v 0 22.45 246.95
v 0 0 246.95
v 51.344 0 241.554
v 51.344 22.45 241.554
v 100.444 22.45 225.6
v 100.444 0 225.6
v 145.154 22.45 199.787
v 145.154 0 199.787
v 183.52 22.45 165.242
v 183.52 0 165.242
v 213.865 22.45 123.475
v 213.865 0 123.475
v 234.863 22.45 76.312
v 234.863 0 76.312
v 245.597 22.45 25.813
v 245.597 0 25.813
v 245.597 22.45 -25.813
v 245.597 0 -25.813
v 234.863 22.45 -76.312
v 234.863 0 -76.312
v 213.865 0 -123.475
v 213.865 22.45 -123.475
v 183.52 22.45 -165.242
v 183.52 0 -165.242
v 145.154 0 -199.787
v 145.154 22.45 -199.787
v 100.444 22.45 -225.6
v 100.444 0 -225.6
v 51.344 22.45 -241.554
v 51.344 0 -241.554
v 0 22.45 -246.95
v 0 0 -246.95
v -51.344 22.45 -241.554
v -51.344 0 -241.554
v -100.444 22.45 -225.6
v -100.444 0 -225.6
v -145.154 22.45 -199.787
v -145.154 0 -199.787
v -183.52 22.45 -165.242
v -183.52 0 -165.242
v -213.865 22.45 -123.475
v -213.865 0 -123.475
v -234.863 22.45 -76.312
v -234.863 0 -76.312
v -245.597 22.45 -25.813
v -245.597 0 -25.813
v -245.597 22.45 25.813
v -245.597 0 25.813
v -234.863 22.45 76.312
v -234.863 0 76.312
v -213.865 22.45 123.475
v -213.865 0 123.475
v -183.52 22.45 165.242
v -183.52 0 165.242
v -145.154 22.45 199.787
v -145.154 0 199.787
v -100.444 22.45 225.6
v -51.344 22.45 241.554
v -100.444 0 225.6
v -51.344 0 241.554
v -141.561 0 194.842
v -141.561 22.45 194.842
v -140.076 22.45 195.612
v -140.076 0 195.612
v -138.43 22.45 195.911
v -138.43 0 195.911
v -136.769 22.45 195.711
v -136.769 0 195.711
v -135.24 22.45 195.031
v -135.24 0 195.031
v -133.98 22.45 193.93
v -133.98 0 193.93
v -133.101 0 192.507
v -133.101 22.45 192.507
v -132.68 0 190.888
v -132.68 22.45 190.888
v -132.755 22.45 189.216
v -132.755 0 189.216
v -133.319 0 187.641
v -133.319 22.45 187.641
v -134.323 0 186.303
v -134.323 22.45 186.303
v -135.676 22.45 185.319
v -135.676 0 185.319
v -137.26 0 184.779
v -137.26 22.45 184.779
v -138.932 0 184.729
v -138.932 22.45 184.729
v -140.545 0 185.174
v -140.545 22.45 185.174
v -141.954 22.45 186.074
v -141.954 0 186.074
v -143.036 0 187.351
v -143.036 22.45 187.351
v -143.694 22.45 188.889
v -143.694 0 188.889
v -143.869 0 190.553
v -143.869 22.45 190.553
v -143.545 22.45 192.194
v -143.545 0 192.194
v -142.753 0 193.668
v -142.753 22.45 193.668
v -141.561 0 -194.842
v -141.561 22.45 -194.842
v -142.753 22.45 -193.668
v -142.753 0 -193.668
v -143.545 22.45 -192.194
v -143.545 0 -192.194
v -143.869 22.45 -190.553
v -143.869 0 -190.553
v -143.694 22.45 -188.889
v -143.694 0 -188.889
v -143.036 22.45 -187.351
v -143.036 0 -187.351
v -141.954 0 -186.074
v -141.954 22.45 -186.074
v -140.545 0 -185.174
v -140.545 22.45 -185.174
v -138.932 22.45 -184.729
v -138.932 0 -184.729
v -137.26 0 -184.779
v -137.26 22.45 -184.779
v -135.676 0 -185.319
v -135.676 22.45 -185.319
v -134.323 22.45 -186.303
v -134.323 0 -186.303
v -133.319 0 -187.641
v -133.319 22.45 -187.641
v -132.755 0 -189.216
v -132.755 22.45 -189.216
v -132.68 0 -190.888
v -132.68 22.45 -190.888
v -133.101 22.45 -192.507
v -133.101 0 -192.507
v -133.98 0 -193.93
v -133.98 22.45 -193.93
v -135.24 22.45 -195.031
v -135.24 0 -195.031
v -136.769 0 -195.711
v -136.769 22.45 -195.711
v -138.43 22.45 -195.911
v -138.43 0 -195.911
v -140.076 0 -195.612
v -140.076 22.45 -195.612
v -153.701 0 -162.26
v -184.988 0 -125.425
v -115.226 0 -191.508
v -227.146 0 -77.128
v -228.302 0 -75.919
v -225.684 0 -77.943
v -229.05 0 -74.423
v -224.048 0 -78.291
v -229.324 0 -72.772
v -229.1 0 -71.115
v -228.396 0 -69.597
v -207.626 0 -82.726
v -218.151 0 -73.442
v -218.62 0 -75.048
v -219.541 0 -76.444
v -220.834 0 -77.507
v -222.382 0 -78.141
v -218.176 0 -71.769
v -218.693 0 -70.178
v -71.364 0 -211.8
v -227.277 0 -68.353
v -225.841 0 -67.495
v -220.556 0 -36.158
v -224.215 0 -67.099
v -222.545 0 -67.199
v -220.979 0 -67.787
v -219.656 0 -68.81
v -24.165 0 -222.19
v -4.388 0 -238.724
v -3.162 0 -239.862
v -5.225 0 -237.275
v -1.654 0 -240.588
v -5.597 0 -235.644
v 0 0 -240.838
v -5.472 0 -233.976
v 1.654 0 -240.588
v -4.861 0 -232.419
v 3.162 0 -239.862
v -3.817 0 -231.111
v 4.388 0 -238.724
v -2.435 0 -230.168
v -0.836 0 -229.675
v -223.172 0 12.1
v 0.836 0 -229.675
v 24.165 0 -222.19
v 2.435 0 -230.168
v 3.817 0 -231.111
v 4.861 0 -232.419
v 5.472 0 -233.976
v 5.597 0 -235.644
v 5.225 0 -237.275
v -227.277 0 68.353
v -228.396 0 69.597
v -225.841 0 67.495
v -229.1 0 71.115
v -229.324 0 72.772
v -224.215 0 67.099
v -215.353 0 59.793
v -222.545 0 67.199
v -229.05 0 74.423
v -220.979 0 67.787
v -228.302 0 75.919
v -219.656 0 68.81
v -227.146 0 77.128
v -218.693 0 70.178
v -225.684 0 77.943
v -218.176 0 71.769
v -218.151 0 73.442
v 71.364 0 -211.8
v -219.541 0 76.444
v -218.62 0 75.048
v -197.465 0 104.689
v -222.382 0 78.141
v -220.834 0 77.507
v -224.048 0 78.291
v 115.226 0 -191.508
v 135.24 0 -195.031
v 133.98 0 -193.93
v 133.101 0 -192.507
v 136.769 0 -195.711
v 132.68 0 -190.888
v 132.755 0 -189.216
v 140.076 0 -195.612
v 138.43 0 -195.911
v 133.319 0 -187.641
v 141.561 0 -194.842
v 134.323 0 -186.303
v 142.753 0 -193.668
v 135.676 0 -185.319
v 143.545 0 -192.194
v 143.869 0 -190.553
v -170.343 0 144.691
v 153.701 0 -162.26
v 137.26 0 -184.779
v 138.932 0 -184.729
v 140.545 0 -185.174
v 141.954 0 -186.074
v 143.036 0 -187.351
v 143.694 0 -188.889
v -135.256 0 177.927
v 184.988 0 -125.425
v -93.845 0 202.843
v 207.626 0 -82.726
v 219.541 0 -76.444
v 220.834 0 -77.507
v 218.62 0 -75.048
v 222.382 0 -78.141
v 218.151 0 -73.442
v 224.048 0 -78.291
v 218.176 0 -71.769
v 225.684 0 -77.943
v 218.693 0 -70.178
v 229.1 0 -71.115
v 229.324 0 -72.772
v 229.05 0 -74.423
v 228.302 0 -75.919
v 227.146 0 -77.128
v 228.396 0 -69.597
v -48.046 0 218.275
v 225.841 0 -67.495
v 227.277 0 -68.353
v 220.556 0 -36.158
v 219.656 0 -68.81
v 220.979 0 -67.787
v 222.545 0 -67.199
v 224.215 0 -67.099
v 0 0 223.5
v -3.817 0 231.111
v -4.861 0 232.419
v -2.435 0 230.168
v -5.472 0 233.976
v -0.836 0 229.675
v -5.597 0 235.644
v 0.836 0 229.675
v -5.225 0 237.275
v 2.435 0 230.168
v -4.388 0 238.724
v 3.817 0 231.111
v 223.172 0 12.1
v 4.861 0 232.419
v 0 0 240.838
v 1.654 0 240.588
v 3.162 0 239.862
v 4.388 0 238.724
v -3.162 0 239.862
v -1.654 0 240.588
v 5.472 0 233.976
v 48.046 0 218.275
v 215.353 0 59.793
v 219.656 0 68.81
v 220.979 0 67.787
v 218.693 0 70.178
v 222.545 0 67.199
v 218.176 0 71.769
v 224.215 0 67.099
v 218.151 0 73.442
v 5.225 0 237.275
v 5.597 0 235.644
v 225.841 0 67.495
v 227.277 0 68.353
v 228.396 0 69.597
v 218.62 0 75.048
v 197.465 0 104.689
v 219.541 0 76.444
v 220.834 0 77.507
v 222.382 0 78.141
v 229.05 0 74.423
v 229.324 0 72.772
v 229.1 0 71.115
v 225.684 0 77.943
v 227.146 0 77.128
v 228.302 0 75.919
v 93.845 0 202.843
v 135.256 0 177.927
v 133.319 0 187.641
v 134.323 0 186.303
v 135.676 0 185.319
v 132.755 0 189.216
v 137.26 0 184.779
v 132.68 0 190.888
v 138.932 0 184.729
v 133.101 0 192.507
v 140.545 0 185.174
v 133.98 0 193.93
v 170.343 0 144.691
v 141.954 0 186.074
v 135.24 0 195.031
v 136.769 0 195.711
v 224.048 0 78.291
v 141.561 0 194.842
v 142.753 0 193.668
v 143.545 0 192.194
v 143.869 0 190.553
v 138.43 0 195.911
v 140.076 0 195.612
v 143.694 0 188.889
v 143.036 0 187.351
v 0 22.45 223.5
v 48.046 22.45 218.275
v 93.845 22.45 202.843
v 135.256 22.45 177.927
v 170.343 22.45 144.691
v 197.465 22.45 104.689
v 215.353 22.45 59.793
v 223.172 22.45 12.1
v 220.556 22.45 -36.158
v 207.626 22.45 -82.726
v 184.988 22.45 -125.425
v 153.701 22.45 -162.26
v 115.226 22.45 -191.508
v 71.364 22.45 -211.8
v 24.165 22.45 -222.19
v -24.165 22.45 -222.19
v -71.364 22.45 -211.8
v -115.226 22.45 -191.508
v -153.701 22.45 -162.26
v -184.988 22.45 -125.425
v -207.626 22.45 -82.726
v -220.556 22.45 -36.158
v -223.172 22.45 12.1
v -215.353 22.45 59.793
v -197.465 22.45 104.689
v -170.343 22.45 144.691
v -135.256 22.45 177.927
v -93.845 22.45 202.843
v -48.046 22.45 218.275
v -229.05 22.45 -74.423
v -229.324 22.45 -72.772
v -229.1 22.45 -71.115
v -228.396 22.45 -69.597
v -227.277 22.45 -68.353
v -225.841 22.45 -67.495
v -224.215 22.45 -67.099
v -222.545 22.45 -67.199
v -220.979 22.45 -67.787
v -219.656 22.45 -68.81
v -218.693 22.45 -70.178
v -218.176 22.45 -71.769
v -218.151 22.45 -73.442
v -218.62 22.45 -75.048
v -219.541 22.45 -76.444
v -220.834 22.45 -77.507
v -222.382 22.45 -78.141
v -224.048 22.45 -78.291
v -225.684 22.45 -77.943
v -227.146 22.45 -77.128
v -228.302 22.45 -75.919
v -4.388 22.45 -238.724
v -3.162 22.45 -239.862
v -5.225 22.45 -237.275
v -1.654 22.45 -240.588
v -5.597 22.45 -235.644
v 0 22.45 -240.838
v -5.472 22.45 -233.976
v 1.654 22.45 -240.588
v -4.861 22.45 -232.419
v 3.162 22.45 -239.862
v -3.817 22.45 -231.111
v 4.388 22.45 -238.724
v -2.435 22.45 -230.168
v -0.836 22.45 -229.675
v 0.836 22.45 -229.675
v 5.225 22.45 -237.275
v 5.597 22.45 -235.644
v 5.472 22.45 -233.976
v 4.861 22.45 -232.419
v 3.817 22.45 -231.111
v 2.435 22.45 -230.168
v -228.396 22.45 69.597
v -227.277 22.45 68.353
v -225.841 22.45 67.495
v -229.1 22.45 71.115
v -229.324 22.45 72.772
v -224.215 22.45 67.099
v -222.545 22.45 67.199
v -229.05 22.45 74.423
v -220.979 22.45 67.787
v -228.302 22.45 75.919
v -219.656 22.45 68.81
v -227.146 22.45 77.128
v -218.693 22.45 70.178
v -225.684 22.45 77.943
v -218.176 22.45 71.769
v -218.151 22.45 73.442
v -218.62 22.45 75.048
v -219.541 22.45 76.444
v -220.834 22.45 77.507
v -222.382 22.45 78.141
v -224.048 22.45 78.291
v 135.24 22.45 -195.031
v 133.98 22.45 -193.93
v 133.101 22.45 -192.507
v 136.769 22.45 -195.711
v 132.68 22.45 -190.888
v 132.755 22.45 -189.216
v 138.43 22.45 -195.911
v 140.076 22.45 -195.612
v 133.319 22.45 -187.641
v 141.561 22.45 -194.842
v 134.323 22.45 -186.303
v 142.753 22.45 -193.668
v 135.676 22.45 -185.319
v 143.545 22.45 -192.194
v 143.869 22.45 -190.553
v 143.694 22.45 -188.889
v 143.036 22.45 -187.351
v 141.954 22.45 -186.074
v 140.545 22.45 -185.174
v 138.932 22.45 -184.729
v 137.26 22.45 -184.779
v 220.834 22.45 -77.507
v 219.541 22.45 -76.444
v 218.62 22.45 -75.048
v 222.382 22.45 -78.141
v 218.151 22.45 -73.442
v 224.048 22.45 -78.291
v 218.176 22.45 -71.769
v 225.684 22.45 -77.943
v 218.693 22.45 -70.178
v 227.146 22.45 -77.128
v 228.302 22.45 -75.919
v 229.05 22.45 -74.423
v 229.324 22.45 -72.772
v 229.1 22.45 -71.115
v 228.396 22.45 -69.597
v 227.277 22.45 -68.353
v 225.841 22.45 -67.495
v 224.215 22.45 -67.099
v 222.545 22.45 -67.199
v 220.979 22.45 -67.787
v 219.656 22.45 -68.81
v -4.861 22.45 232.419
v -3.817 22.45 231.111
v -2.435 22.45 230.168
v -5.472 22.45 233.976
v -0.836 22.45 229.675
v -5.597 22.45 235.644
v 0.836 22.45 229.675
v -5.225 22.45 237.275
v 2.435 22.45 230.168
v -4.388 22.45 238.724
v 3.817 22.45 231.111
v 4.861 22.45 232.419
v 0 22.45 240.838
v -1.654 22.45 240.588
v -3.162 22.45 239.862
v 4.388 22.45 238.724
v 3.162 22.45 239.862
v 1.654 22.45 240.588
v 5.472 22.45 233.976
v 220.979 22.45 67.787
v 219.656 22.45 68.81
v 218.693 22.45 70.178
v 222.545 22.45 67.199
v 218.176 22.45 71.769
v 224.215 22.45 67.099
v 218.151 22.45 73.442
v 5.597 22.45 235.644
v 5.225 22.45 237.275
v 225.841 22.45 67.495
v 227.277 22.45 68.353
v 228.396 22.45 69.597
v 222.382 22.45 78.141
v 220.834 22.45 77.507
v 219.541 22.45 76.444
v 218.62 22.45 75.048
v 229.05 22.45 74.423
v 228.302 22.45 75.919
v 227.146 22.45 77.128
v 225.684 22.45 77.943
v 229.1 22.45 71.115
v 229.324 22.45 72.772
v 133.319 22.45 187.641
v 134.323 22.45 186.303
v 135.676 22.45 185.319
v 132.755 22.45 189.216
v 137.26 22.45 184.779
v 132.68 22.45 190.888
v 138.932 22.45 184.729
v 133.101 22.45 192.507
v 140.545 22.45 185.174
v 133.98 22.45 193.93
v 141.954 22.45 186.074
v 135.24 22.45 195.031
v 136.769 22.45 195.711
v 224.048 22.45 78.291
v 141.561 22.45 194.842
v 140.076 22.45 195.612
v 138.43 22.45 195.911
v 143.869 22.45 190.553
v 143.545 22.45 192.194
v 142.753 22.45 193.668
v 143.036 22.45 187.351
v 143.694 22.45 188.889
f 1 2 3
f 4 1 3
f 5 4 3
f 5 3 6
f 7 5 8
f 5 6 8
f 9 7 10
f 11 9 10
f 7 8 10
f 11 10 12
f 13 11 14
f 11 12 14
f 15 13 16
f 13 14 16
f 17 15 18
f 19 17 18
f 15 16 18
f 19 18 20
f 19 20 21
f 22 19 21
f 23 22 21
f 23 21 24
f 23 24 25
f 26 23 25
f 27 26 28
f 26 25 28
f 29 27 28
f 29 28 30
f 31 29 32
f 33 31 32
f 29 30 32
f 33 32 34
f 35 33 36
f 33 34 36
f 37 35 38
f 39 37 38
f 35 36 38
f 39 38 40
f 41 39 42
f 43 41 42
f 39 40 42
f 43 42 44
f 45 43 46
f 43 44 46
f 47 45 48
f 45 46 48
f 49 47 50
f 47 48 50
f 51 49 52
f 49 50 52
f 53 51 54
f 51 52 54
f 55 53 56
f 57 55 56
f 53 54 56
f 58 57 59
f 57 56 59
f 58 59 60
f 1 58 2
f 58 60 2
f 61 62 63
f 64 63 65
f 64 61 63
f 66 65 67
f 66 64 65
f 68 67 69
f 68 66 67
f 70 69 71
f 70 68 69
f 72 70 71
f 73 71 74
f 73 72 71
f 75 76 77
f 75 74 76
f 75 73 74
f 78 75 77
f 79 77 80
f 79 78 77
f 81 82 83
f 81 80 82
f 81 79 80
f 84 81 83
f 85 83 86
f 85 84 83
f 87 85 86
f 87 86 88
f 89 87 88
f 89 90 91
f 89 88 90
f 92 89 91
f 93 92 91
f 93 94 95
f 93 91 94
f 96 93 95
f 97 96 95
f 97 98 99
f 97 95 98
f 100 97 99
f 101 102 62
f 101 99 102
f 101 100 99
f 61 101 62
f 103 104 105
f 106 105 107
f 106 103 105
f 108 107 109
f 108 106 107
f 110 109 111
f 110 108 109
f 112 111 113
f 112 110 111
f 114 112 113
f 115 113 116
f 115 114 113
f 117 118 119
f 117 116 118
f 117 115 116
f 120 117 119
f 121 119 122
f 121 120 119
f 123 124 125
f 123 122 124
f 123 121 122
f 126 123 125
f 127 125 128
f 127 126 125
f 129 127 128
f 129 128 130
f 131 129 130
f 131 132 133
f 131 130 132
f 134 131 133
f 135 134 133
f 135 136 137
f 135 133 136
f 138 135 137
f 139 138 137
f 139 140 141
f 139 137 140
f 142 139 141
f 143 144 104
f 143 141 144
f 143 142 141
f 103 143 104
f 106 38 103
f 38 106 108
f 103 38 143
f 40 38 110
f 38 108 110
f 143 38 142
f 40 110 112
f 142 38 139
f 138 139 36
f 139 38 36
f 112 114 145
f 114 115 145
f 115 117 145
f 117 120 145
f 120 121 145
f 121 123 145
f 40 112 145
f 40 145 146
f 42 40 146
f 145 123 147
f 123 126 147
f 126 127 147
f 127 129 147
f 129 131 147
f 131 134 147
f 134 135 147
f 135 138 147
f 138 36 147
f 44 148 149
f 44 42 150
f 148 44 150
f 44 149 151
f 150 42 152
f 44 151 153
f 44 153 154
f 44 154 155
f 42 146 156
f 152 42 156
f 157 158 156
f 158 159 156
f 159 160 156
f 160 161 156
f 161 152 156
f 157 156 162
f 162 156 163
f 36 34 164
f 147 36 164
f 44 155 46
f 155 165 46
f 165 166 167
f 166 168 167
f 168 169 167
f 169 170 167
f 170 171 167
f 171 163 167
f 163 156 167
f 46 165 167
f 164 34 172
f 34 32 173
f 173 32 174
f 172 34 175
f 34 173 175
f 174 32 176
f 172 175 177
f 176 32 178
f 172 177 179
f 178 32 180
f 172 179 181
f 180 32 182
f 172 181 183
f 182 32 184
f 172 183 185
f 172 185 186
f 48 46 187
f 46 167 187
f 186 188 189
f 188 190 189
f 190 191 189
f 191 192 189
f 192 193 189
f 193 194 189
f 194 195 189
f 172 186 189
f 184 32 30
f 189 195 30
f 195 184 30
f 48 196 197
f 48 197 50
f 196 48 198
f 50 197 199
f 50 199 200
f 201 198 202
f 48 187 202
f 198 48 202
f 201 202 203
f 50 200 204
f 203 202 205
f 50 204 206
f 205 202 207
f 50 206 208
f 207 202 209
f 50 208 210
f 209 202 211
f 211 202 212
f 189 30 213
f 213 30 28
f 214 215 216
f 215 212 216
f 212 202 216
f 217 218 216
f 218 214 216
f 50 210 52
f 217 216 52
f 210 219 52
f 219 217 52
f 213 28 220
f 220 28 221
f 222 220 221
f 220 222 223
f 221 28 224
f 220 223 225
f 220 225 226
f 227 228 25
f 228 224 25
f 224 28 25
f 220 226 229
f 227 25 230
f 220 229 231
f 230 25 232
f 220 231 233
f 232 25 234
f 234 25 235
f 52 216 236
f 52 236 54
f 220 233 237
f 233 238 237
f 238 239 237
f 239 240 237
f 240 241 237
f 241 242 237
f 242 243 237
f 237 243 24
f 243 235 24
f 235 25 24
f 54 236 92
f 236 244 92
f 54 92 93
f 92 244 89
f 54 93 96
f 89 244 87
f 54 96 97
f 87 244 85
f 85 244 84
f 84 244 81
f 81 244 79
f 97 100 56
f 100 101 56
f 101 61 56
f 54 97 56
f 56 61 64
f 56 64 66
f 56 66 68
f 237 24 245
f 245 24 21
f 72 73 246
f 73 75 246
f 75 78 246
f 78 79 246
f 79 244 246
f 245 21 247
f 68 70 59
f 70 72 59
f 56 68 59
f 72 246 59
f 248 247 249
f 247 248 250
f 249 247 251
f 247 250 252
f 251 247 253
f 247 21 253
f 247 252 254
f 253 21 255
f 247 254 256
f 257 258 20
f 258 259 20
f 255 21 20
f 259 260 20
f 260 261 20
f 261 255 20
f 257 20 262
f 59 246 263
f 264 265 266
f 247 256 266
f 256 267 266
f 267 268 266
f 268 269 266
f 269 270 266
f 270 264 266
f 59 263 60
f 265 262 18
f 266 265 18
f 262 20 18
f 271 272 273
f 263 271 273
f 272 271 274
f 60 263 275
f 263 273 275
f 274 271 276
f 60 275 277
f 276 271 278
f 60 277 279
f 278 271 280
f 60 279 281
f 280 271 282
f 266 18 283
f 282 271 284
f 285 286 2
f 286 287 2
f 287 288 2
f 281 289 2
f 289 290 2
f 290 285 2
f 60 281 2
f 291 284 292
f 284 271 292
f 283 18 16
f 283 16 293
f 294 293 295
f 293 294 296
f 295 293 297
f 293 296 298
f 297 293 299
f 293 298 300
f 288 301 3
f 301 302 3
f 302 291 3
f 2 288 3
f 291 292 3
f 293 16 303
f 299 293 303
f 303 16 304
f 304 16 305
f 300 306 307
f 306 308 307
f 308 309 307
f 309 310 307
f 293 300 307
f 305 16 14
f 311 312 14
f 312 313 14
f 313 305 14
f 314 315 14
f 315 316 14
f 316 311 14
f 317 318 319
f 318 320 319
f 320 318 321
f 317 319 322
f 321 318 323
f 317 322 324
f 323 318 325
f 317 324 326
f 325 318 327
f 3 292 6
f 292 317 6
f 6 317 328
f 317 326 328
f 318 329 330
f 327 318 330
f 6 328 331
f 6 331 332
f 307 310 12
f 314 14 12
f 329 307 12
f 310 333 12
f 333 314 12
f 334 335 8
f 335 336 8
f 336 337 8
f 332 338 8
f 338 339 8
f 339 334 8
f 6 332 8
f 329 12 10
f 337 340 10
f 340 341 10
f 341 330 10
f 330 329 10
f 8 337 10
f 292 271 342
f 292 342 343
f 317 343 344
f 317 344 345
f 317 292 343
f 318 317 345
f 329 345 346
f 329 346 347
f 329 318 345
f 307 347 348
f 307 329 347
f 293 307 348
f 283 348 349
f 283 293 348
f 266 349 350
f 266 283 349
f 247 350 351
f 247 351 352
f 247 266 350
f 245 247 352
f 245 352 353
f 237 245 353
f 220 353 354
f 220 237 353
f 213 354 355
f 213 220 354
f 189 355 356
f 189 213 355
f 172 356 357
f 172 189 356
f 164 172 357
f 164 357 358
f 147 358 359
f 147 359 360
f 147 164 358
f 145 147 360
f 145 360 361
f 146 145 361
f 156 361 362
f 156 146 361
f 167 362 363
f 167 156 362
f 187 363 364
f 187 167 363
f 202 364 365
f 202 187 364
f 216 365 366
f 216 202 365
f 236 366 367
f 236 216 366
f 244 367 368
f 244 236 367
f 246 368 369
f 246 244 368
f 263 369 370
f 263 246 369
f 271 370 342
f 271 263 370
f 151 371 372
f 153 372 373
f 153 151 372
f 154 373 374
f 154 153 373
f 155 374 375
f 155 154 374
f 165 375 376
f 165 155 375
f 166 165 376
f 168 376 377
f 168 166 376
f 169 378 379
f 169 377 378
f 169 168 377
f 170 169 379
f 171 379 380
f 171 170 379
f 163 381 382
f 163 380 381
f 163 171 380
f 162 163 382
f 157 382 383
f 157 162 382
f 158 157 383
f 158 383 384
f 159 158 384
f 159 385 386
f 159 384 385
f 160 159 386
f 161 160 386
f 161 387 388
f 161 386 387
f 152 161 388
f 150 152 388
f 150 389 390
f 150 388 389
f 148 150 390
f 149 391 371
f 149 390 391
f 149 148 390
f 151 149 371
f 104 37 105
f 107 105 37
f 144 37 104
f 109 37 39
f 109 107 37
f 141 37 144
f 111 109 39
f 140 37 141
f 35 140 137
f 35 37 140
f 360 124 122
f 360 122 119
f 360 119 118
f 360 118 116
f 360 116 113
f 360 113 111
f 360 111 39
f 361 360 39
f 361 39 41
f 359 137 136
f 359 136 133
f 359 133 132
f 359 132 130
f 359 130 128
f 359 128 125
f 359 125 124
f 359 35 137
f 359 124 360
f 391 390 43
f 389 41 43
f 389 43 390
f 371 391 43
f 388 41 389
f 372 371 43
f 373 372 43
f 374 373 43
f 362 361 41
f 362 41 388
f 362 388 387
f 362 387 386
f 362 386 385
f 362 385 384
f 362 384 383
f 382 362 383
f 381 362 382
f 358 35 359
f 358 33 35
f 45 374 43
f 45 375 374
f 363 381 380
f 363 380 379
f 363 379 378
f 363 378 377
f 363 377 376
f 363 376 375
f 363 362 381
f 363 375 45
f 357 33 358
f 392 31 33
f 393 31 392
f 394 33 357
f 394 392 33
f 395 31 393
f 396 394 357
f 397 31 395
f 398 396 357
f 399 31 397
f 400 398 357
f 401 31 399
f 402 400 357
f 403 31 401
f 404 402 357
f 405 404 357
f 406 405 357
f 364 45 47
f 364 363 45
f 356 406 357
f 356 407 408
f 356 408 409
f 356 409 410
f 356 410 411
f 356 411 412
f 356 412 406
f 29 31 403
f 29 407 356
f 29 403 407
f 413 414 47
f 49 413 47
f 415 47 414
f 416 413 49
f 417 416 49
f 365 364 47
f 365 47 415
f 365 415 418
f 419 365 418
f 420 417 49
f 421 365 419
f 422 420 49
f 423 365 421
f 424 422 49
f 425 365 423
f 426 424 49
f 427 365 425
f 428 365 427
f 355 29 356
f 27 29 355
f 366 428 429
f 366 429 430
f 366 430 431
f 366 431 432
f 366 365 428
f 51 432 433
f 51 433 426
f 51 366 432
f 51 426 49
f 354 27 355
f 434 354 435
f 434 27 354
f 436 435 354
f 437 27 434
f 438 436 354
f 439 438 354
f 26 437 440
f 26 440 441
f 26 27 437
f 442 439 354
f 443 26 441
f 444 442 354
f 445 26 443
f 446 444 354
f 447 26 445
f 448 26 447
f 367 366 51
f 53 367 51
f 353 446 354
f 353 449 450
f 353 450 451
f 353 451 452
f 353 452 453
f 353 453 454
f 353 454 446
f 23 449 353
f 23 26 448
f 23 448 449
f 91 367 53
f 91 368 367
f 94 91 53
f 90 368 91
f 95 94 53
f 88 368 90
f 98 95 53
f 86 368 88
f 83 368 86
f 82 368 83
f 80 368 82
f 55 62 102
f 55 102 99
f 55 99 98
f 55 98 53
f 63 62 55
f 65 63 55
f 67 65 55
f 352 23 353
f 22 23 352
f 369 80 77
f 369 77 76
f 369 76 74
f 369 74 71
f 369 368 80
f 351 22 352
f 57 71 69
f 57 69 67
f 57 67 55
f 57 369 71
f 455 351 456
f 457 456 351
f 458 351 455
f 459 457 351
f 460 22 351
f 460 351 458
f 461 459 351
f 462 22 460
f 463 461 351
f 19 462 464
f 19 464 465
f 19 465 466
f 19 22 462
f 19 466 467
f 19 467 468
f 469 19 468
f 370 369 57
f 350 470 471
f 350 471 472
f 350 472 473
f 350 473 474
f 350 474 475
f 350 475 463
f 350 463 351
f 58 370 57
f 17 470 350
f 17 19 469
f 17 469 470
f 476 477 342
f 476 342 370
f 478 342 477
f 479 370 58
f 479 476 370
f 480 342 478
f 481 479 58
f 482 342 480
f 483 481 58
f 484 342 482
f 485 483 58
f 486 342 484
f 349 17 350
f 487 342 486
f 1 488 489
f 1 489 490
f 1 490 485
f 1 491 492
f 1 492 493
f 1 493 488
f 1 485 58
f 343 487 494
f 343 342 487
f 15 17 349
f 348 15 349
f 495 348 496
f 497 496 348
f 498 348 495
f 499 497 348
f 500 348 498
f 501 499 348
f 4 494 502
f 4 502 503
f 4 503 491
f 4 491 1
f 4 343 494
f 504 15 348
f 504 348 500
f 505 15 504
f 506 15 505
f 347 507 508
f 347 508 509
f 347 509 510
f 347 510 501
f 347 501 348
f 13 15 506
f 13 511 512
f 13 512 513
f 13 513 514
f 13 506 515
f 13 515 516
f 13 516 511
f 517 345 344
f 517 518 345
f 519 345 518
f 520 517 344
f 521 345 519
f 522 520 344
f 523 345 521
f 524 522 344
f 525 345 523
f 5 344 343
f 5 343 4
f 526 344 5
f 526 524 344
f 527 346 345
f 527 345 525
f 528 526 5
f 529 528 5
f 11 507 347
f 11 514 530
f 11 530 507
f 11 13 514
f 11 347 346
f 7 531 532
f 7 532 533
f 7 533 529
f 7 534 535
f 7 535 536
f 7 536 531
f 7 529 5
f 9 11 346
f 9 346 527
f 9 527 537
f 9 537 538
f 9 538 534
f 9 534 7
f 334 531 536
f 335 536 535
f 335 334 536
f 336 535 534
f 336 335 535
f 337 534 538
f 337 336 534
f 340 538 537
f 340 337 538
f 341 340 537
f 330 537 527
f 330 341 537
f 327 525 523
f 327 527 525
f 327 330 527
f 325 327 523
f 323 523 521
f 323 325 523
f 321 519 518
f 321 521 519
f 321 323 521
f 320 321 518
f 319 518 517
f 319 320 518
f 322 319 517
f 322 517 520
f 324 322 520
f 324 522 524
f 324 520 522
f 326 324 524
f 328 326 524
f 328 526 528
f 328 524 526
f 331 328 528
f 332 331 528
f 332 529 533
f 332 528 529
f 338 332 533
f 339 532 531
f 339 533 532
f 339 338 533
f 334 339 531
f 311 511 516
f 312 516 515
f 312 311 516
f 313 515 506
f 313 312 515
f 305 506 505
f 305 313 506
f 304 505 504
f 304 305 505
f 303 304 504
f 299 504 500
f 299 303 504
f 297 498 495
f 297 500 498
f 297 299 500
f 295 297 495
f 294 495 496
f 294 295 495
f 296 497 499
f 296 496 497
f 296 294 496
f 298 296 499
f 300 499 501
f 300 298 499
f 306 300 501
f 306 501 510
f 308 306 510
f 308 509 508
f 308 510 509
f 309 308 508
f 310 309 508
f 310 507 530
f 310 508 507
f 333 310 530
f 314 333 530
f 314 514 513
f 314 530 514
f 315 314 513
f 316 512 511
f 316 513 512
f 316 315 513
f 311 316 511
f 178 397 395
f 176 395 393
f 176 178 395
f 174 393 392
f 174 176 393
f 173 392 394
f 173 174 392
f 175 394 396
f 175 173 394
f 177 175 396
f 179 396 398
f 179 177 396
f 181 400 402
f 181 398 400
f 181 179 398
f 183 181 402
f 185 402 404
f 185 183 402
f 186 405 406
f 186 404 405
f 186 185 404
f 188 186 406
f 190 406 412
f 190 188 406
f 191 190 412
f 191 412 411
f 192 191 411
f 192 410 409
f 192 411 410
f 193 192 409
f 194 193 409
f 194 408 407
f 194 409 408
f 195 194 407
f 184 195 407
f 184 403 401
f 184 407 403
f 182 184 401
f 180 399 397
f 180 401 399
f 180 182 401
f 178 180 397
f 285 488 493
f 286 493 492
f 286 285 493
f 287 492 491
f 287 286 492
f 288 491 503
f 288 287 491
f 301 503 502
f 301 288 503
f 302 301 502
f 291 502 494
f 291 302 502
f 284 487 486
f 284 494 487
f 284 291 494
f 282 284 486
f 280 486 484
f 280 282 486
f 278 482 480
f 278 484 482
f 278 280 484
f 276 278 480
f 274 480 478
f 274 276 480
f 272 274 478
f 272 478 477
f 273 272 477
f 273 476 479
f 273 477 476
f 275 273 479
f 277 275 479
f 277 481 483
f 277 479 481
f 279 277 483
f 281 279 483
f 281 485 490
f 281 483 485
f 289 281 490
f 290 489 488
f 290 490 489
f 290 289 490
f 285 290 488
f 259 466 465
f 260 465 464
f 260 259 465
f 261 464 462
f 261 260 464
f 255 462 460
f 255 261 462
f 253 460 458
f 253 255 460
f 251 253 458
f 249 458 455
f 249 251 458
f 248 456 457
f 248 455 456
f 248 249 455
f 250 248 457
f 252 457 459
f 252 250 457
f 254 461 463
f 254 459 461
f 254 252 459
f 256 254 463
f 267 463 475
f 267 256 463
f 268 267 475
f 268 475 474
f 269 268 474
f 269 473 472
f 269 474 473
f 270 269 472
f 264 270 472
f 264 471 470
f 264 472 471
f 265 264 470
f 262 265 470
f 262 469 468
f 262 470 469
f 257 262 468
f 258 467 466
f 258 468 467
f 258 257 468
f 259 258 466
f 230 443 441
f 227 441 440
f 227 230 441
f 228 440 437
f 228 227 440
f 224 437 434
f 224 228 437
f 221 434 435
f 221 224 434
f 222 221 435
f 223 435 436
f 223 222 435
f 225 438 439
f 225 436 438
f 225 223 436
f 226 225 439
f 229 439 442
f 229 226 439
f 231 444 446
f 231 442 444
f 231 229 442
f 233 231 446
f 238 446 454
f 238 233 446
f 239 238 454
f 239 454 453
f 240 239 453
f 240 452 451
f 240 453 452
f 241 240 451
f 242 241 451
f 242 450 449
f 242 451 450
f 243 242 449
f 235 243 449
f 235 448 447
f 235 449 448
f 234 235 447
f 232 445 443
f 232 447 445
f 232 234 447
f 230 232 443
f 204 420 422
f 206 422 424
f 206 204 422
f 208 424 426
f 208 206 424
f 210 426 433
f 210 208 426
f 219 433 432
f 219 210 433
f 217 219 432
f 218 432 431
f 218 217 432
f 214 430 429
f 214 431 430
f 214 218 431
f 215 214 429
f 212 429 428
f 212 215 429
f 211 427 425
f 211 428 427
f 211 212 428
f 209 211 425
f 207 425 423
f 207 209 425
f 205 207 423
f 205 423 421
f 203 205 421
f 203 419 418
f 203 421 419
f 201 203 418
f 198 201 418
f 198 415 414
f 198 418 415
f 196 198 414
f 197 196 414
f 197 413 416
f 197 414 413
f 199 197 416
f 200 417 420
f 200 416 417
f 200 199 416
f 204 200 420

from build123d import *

# Parameters (mm, degrees)
SKETCH_1_R               = 246.95
SKETCH_1_R_2             = 223.5
EXTRUDE_5_DEPTH          = 22.45
SKETCH_1_5_R             = 5.6125
CUT_EXTRUDE_1_DEPTH      = 350.960865669
PATTERN_CIRCULAR_2_COUNT = 10


with BuildPart() as part:
    # Эскиз1 → Бобышка-Вытянуть5 (new body)
    with BuildSketch(Plane(origin=(0, 0, 0), x_dir=(1, 0, 0), z_dir=(0, 1, 0))):
        with Locations(Location((0, 0, 0), (0, 0, 270))):
            Circle(SKETCH_1_R)
        with Locations(Location((0, 0, 0), (0, 0, 270))):
            Circle(SKETCH_1_R_2, mode=Mode.SUBTRACT)
    extrude(amount=EXTRUDE_5_DEPTH)

    # Эскиз1<5> → Вырез-Вытянуть1 (cut, through all)
    with BuildSketch(Plane(origin=(0, 0, 0), x_dir=(1, 0, 0), z_dir=(0, 1, 0))):
        with Locations(Location((0, -235.225, 0), (0, 0, 270))):
            Circle(SKETCH_1_5_R)
    cut_extrude_1 = extrude(amount=CUT_EXTRUDE_1_DEPTH, mode=Mode.SUBTRACT)

    # Круговой массив2: Вырез-Вытянуть1 ×10 about axis
    pattern_circular_2_axis = Axis((0, 0, 0), (0, 1, 0))
    for i in range(1, PATTERN_CIRCULAR_2_COUNT):
        add(cut_extrude_1.rotate(pattern_circular_2_axis, i * 360 / PATTERN_CIRCULAR_2_COUNT), mode=Mode.SUBTRACT)


solid = part.part
